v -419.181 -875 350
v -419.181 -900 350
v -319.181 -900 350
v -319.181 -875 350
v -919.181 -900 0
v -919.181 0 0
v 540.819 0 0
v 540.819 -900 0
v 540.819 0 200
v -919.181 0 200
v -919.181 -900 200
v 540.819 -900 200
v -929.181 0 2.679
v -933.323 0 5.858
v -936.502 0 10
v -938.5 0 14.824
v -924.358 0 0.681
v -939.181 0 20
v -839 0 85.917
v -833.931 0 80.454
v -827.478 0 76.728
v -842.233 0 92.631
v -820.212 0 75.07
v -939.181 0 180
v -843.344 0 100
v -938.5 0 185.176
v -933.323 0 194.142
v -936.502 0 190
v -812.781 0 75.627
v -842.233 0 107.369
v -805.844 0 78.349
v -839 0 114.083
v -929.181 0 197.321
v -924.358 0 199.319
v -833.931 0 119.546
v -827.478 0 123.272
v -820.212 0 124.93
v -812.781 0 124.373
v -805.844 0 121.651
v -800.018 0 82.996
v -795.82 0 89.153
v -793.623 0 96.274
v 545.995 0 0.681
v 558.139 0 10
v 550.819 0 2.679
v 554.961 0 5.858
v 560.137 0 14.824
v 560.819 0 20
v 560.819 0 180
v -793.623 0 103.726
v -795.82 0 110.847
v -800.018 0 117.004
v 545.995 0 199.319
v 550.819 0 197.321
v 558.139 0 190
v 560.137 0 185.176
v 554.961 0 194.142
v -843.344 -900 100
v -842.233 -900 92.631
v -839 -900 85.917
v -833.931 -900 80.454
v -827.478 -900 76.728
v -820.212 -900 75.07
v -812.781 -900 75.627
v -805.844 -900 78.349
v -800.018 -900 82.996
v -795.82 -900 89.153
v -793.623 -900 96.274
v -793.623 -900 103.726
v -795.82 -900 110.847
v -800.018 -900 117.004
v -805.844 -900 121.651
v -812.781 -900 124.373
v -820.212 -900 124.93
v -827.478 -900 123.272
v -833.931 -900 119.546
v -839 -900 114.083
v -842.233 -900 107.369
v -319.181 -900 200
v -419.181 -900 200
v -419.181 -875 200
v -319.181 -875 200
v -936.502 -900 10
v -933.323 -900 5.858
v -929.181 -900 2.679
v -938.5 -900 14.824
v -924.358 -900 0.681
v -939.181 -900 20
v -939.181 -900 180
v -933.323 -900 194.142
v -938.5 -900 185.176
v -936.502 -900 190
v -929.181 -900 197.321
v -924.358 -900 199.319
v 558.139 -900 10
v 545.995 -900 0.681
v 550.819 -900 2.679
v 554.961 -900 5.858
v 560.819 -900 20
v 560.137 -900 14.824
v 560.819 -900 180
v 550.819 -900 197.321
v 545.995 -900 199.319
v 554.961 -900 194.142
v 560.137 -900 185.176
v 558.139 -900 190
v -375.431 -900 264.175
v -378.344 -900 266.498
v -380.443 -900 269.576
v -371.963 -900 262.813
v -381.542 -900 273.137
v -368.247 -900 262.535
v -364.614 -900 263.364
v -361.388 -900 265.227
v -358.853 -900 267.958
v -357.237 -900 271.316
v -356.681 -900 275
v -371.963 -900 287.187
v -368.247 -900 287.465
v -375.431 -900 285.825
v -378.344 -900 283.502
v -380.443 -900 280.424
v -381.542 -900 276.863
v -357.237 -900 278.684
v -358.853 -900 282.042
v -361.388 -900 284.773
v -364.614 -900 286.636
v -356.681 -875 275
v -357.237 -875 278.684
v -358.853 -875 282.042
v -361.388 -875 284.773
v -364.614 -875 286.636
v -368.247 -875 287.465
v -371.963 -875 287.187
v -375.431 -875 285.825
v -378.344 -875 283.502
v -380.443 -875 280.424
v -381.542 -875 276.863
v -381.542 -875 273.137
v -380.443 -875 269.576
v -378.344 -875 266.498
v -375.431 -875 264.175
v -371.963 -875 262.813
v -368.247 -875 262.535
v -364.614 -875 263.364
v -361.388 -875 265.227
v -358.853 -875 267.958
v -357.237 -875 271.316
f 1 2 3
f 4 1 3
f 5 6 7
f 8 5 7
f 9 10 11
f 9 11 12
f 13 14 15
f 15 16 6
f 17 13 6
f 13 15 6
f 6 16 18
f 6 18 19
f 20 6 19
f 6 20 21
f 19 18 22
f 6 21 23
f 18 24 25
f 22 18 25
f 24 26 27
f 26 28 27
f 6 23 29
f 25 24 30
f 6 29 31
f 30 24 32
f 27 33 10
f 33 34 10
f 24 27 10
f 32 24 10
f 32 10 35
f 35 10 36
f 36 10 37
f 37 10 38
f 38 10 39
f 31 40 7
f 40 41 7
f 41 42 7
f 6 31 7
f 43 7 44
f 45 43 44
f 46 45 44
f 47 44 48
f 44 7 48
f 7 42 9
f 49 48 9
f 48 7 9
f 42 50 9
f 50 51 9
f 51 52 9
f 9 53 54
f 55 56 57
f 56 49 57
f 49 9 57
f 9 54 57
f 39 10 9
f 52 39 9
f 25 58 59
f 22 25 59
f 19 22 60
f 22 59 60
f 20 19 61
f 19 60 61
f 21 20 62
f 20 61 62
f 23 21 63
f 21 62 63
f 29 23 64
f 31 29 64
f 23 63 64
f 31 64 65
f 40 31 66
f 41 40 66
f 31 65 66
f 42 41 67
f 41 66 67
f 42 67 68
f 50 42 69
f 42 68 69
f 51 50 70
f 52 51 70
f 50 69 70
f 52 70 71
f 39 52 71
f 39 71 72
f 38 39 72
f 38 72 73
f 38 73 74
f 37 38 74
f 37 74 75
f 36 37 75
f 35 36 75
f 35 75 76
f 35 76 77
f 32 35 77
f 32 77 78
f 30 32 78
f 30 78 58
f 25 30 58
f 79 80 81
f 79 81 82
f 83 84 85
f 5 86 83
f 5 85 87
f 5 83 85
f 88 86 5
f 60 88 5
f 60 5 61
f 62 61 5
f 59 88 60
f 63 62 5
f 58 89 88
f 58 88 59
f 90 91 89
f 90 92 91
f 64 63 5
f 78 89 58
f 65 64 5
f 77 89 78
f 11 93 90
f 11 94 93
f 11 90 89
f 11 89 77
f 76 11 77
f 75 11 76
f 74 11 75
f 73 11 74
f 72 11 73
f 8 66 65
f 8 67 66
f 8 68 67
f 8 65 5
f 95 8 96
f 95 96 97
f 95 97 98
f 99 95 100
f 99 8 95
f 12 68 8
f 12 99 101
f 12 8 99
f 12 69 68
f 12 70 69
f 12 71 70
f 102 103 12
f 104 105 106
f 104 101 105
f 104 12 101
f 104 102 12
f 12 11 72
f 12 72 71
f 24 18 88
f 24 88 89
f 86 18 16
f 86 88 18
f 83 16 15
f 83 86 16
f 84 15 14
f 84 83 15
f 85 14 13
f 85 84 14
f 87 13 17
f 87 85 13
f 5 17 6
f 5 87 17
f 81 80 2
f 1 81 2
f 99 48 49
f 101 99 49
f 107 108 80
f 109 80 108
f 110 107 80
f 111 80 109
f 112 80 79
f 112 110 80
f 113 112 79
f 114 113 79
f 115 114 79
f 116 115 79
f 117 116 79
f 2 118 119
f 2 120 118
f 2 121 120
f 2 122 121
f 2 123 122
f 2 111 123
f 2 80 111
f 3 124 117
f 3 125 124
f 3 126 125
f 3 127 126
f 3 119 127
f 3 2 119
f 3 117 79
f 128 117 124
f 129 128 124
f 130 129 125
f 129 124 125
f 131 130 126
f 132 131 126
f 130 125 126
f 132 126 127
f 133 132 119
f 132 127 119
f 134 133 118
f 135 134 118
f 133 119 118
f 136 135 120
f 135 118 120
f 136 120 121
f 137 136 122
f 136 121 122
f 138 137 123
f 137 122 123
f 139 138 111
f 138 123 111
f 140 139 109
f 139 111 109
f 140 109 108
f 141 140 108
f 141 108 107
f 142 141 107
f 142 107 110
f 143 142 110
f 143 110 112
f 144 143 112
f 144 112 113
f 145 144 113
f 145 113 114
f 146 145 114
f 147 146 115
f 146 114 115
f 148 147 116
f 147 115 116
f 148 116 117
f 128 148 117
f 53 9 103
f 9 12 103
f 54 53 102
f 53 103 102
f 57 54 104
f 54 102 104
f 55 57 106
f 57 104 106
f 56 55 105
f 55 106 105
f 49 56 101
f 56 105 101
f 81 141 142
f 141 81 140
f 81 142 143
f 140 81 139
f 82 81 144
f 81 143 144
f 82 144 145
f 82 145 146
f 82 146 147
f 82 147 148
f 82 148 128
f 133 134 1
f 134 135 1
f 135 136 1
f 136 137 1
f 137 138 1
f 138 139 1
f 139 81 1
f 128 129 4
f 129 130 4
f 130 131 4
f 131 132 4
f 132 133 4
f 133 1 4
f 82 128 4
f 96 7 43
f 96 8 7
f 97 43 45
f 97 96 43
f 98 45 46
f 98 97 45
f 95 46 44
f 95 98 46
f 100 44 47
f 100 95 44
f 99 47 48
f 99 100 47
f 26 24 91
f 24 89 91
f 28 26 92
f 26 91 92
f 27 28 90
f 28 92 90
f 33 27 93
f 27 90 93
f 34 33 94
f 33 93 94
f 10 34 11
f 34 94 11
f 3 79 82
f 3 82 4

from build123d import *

# Parameters (mm, degrees)
F0_W     = 1500
F0_H     = 200
F1_DEPTH = 900
F2_D     = 50
F3_R     = 20
F4_W     = 100
F4_H     = 150
F4_R     = 12.5
F5_DEPTH = 25


with BuildPart() as f1:
    # F0 (on Front) → F1 (new body)
    with BuildSketch(Plane.XZ):
        with Locations((-189.1812320633, 100)):
            Rectangle(F0_W, F0_H)
    extrude(amount=F1_DEPTH)

    # F2 (through all)
    with Locations(Plane(origin=(0, 0, 0), x_dir=(1, 0, 0), z_dir=(0, 1, 0))):
        with Locations((-818.3439970016, -100)):
            Hole(F2_D / 2)

    # F3
    f3_edges = [f1.edges().sort_by_distance(p)[0] for p in [
        (-939.181232, -450, 200),
        (-939.181232, -450, 0),
        (560.818768, -450, 200),
        (560.818768, -450, 0),
    ]]
    fillet(f3_edges, radius=F3_R)


with BuildPart() as f5:
    # F4 (on face) → F5 (new body)
    with BuildSketch(Plane.XZ.offset(900)):
        with Locations((-369.1812320633, 275)):
            Rectangle(F4_W, F4_H)
        with Locations((-369.1812320633, 275)):
            Circle(F4_R, mode=Mode.SUBTRACT)
    extrude(amount=-F5_DEPTH)


solid = Compound([f1.part, f5.part])
